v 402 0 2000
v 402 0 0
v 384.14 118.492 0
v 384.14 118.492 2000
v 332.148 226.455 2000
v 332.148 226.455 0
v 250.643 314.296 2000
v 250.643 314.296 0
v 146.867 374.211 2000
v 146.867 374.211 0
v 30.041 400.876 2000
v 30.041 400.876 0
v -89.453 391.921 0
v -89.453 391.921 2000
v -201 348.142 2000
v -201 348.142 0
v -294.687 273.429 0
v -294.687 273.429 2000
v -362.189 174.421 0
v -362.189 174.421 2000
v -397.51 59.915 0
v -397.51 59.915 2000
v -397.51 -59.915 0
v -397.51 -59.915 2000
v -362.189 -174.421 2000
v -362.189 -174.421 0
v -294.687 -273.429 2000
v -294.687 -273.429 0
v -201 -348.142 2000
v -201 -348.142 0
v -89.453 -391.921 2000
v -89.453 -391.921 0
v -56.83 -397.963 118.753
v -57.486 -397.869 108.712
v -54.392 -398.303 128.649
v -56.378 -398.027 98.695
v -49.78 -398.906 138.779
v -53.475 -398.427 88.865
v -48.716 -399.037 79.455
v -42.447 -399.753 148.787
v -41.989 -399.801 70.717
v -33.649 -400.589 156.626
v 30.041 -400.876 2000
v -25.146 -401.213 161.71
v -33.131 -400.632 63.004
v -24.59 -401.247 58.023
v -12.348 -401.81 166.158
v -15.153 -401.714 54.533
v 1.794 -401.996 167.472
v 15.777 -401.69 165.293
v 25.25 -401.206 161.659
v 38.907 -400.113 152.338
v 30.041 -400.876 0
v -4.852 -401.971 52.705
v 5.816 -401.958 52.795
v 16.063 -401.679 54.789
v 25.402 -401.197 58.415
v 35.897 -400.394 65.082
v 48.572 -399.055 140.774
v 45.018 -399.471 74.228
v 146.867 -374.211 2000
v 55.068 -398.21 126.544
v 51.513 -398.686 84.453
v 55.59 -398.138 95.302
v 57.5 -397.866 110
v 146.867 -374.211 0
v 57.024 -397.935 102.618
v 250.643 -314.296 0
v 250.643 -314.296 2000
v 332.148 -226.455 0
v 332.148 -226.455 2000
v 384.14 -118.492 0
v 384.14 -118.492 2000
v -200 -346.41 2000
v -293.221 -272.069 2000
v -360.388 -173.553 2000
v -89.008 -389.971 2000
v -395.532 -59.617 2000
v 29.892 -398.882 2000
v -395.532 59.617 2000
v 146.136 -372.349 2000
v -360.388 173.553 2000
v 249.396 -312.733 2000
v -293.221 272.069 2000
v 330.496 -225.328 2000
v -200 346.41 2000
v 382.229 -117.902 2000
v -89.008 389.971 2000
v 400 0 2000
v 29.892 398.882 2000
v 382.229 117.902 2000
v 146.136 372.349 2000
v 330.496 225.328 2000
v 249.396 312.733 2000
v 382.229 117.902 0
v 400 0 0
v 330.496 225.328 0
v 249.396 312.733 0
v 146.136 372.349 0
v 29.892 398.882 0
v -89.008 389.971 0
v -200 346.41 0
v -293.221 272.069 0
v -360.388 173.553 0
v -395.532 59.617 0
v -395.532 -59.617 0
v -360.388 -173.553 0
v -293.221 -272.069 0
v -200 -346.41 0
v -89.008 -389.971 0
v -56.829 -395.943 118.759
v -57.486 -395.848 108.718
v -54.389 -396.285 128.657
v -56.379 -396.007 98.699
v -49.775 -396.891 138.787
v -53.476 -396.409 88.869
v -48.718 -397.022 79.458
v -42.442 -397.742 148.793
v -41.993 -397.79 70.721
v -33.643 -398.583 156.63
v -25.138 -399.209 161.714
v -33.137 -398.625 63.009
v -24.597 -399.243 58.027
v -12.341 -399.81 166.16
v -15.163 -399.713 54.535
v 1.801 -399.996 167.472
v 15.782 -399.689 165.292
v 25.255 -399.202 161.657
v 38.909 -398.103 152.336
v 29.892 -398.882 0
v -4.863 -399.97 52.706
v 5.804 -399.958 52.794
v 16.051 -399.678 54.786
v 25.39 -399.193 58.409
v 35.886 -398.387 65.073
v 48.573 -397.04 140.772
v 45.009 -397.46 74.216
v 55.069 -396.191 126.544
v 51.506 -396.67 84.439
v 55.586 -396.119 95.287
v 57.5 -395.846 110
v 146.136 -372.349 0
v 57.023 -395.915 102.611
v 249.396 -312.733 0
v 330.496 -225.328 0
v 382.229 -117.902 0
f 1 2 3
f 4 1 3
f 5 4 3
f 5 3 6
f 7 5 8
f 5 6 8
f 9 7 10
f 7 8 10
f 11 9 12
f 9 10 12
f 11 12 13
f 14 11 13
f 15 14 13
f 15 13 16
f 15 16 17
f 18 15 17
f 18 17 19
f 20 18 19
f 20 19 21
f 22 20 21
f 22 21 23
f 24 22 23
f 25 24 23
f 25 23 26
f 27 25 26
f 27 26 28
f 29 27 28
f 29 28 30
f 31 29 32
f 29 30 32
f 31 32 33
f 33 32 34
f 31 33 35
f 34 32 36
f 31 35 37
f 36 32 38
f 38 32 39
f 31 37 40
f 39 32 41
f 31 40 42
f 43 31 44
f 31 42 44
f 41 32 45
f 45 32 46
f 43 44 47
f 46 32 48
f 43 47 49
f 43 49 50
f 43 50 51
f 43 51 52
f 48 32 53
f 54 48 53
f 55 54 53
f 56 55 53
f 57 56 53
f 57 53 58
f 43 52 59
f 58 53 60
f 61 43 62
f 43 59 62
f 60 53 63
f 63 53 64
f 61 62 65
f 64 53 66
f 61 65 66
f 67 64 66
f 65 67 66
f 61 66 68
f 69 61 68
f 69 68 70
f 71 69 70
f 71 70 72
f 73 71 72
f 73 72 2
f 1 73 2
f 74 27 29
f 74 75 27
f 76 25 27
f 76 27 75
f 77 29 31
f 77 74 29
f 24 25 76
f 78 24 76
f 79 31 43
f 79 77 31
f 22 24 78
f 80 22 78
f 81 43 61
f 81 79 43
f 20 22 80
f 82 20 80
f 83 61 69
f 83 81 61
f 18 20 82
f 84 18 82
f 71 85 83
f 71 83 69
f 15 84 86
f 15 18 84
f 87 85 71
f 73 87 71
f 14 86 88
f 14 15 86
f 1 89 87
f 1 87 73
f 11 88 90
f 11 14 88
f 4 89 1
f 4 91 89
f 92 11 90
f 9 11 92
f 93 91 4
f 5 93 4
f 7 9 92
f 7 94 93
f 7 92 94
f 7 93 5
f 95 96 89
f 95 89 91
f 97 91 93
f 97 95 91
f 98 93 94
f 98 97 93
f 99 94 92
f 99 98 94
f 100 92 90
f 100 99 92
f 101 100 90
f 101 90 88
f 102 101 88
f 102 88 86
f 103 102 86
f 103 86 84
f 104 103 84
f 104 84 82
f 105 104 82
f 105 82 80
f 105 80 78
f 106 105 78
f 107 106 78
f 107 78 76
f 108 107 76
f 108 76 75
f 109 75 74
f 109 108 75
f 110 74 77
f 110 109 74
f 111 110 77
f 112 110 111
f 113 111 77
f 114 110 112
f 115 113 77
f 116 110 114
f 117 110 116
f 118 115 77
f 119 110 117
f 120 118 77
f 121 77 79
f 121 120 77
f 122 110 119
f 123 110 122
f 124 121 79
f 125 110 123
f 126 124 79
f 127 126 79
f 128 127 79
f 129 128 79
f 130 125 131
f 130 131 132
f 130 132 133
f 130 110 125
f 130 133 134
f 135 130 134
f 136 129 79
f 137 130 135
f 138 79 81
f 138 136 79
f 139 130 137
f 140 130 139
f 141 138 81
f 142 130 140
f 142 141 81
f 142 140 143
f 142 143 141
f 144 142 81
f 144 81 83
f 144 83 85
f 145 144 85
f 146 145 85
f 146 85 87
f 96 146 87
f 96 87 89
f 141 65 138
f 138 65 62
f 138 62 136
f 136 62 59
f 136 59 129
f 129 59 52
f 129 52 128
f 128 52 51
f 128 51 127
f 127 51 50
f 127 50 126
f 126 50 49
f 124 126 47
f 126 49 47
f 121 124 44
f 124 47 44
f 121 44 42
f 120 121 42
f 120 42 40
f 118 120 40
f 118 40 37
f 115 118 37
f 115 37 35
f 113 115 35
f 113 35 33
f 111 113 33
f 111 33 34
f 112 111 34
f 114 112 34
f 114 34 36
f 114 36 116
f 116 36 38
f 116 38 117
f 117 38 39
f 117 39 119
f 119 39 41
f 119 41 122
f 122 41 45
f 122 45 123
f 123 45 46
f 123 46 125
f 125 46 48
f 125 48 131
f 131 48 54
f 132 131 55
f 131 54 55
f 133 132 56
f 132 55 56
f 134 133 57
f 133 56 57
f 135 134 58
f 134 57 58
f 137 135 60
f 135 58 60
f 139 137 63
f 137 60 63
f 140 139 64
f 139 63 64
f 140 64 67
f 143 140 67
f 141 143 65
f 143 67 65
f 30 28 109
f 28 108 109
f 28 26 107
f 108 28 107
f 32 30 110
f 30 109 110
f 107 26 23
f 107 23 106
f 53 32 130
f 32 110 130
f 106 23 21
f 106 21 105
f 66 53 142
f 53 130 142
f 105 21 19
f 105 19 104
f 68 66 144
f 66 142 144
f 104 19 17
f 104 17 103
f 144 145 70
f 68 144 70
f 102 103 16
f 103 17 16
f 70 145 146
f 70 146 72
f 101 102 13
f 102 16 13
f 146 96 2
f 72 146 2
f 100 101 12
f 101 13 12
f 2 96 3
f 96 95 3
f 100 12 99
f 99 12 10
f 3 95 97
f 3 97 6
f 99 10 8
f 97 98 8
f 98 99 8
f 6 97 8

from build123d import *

# Parameters (mm, degrees)
F0_R      = 402
F0_R_2    = 400
F1_DEPTH  = 2000
F2_R      = 57.5
F3_DEPTH  = 500
F3_FACE_R = 57.5
F4_DEPTH  = 500


with BuildPart() as f1:
    # F0 (on Top) → F1 (new body)
    with BuildSketch(Plane.XY):
        Circle(F0_R)
        Circle(F0_R_2, mode=Mode.SUBTRACT)
    extrude(amount=F1_DEPTH)

    # F2 (on Front) → F3 (join)
    with BuildSketch(Plane.XZ):
        with Locations((0, 110)):
            Circle(F2_R)
    extrude(amount=F3_DEPTH)

    # F3_face (on face) → F4 (cut, through all)
    with BuildSketch(Plane(origin=(0, -500, 110), x_dir=(1, 0, 0), z_dir=(0, -1, 0))):
        Circle(F3_FACE_R)
    extrude(amount=-F4_DEPTH, mode=Mode.SUBTRACT)


solid = f1.part
